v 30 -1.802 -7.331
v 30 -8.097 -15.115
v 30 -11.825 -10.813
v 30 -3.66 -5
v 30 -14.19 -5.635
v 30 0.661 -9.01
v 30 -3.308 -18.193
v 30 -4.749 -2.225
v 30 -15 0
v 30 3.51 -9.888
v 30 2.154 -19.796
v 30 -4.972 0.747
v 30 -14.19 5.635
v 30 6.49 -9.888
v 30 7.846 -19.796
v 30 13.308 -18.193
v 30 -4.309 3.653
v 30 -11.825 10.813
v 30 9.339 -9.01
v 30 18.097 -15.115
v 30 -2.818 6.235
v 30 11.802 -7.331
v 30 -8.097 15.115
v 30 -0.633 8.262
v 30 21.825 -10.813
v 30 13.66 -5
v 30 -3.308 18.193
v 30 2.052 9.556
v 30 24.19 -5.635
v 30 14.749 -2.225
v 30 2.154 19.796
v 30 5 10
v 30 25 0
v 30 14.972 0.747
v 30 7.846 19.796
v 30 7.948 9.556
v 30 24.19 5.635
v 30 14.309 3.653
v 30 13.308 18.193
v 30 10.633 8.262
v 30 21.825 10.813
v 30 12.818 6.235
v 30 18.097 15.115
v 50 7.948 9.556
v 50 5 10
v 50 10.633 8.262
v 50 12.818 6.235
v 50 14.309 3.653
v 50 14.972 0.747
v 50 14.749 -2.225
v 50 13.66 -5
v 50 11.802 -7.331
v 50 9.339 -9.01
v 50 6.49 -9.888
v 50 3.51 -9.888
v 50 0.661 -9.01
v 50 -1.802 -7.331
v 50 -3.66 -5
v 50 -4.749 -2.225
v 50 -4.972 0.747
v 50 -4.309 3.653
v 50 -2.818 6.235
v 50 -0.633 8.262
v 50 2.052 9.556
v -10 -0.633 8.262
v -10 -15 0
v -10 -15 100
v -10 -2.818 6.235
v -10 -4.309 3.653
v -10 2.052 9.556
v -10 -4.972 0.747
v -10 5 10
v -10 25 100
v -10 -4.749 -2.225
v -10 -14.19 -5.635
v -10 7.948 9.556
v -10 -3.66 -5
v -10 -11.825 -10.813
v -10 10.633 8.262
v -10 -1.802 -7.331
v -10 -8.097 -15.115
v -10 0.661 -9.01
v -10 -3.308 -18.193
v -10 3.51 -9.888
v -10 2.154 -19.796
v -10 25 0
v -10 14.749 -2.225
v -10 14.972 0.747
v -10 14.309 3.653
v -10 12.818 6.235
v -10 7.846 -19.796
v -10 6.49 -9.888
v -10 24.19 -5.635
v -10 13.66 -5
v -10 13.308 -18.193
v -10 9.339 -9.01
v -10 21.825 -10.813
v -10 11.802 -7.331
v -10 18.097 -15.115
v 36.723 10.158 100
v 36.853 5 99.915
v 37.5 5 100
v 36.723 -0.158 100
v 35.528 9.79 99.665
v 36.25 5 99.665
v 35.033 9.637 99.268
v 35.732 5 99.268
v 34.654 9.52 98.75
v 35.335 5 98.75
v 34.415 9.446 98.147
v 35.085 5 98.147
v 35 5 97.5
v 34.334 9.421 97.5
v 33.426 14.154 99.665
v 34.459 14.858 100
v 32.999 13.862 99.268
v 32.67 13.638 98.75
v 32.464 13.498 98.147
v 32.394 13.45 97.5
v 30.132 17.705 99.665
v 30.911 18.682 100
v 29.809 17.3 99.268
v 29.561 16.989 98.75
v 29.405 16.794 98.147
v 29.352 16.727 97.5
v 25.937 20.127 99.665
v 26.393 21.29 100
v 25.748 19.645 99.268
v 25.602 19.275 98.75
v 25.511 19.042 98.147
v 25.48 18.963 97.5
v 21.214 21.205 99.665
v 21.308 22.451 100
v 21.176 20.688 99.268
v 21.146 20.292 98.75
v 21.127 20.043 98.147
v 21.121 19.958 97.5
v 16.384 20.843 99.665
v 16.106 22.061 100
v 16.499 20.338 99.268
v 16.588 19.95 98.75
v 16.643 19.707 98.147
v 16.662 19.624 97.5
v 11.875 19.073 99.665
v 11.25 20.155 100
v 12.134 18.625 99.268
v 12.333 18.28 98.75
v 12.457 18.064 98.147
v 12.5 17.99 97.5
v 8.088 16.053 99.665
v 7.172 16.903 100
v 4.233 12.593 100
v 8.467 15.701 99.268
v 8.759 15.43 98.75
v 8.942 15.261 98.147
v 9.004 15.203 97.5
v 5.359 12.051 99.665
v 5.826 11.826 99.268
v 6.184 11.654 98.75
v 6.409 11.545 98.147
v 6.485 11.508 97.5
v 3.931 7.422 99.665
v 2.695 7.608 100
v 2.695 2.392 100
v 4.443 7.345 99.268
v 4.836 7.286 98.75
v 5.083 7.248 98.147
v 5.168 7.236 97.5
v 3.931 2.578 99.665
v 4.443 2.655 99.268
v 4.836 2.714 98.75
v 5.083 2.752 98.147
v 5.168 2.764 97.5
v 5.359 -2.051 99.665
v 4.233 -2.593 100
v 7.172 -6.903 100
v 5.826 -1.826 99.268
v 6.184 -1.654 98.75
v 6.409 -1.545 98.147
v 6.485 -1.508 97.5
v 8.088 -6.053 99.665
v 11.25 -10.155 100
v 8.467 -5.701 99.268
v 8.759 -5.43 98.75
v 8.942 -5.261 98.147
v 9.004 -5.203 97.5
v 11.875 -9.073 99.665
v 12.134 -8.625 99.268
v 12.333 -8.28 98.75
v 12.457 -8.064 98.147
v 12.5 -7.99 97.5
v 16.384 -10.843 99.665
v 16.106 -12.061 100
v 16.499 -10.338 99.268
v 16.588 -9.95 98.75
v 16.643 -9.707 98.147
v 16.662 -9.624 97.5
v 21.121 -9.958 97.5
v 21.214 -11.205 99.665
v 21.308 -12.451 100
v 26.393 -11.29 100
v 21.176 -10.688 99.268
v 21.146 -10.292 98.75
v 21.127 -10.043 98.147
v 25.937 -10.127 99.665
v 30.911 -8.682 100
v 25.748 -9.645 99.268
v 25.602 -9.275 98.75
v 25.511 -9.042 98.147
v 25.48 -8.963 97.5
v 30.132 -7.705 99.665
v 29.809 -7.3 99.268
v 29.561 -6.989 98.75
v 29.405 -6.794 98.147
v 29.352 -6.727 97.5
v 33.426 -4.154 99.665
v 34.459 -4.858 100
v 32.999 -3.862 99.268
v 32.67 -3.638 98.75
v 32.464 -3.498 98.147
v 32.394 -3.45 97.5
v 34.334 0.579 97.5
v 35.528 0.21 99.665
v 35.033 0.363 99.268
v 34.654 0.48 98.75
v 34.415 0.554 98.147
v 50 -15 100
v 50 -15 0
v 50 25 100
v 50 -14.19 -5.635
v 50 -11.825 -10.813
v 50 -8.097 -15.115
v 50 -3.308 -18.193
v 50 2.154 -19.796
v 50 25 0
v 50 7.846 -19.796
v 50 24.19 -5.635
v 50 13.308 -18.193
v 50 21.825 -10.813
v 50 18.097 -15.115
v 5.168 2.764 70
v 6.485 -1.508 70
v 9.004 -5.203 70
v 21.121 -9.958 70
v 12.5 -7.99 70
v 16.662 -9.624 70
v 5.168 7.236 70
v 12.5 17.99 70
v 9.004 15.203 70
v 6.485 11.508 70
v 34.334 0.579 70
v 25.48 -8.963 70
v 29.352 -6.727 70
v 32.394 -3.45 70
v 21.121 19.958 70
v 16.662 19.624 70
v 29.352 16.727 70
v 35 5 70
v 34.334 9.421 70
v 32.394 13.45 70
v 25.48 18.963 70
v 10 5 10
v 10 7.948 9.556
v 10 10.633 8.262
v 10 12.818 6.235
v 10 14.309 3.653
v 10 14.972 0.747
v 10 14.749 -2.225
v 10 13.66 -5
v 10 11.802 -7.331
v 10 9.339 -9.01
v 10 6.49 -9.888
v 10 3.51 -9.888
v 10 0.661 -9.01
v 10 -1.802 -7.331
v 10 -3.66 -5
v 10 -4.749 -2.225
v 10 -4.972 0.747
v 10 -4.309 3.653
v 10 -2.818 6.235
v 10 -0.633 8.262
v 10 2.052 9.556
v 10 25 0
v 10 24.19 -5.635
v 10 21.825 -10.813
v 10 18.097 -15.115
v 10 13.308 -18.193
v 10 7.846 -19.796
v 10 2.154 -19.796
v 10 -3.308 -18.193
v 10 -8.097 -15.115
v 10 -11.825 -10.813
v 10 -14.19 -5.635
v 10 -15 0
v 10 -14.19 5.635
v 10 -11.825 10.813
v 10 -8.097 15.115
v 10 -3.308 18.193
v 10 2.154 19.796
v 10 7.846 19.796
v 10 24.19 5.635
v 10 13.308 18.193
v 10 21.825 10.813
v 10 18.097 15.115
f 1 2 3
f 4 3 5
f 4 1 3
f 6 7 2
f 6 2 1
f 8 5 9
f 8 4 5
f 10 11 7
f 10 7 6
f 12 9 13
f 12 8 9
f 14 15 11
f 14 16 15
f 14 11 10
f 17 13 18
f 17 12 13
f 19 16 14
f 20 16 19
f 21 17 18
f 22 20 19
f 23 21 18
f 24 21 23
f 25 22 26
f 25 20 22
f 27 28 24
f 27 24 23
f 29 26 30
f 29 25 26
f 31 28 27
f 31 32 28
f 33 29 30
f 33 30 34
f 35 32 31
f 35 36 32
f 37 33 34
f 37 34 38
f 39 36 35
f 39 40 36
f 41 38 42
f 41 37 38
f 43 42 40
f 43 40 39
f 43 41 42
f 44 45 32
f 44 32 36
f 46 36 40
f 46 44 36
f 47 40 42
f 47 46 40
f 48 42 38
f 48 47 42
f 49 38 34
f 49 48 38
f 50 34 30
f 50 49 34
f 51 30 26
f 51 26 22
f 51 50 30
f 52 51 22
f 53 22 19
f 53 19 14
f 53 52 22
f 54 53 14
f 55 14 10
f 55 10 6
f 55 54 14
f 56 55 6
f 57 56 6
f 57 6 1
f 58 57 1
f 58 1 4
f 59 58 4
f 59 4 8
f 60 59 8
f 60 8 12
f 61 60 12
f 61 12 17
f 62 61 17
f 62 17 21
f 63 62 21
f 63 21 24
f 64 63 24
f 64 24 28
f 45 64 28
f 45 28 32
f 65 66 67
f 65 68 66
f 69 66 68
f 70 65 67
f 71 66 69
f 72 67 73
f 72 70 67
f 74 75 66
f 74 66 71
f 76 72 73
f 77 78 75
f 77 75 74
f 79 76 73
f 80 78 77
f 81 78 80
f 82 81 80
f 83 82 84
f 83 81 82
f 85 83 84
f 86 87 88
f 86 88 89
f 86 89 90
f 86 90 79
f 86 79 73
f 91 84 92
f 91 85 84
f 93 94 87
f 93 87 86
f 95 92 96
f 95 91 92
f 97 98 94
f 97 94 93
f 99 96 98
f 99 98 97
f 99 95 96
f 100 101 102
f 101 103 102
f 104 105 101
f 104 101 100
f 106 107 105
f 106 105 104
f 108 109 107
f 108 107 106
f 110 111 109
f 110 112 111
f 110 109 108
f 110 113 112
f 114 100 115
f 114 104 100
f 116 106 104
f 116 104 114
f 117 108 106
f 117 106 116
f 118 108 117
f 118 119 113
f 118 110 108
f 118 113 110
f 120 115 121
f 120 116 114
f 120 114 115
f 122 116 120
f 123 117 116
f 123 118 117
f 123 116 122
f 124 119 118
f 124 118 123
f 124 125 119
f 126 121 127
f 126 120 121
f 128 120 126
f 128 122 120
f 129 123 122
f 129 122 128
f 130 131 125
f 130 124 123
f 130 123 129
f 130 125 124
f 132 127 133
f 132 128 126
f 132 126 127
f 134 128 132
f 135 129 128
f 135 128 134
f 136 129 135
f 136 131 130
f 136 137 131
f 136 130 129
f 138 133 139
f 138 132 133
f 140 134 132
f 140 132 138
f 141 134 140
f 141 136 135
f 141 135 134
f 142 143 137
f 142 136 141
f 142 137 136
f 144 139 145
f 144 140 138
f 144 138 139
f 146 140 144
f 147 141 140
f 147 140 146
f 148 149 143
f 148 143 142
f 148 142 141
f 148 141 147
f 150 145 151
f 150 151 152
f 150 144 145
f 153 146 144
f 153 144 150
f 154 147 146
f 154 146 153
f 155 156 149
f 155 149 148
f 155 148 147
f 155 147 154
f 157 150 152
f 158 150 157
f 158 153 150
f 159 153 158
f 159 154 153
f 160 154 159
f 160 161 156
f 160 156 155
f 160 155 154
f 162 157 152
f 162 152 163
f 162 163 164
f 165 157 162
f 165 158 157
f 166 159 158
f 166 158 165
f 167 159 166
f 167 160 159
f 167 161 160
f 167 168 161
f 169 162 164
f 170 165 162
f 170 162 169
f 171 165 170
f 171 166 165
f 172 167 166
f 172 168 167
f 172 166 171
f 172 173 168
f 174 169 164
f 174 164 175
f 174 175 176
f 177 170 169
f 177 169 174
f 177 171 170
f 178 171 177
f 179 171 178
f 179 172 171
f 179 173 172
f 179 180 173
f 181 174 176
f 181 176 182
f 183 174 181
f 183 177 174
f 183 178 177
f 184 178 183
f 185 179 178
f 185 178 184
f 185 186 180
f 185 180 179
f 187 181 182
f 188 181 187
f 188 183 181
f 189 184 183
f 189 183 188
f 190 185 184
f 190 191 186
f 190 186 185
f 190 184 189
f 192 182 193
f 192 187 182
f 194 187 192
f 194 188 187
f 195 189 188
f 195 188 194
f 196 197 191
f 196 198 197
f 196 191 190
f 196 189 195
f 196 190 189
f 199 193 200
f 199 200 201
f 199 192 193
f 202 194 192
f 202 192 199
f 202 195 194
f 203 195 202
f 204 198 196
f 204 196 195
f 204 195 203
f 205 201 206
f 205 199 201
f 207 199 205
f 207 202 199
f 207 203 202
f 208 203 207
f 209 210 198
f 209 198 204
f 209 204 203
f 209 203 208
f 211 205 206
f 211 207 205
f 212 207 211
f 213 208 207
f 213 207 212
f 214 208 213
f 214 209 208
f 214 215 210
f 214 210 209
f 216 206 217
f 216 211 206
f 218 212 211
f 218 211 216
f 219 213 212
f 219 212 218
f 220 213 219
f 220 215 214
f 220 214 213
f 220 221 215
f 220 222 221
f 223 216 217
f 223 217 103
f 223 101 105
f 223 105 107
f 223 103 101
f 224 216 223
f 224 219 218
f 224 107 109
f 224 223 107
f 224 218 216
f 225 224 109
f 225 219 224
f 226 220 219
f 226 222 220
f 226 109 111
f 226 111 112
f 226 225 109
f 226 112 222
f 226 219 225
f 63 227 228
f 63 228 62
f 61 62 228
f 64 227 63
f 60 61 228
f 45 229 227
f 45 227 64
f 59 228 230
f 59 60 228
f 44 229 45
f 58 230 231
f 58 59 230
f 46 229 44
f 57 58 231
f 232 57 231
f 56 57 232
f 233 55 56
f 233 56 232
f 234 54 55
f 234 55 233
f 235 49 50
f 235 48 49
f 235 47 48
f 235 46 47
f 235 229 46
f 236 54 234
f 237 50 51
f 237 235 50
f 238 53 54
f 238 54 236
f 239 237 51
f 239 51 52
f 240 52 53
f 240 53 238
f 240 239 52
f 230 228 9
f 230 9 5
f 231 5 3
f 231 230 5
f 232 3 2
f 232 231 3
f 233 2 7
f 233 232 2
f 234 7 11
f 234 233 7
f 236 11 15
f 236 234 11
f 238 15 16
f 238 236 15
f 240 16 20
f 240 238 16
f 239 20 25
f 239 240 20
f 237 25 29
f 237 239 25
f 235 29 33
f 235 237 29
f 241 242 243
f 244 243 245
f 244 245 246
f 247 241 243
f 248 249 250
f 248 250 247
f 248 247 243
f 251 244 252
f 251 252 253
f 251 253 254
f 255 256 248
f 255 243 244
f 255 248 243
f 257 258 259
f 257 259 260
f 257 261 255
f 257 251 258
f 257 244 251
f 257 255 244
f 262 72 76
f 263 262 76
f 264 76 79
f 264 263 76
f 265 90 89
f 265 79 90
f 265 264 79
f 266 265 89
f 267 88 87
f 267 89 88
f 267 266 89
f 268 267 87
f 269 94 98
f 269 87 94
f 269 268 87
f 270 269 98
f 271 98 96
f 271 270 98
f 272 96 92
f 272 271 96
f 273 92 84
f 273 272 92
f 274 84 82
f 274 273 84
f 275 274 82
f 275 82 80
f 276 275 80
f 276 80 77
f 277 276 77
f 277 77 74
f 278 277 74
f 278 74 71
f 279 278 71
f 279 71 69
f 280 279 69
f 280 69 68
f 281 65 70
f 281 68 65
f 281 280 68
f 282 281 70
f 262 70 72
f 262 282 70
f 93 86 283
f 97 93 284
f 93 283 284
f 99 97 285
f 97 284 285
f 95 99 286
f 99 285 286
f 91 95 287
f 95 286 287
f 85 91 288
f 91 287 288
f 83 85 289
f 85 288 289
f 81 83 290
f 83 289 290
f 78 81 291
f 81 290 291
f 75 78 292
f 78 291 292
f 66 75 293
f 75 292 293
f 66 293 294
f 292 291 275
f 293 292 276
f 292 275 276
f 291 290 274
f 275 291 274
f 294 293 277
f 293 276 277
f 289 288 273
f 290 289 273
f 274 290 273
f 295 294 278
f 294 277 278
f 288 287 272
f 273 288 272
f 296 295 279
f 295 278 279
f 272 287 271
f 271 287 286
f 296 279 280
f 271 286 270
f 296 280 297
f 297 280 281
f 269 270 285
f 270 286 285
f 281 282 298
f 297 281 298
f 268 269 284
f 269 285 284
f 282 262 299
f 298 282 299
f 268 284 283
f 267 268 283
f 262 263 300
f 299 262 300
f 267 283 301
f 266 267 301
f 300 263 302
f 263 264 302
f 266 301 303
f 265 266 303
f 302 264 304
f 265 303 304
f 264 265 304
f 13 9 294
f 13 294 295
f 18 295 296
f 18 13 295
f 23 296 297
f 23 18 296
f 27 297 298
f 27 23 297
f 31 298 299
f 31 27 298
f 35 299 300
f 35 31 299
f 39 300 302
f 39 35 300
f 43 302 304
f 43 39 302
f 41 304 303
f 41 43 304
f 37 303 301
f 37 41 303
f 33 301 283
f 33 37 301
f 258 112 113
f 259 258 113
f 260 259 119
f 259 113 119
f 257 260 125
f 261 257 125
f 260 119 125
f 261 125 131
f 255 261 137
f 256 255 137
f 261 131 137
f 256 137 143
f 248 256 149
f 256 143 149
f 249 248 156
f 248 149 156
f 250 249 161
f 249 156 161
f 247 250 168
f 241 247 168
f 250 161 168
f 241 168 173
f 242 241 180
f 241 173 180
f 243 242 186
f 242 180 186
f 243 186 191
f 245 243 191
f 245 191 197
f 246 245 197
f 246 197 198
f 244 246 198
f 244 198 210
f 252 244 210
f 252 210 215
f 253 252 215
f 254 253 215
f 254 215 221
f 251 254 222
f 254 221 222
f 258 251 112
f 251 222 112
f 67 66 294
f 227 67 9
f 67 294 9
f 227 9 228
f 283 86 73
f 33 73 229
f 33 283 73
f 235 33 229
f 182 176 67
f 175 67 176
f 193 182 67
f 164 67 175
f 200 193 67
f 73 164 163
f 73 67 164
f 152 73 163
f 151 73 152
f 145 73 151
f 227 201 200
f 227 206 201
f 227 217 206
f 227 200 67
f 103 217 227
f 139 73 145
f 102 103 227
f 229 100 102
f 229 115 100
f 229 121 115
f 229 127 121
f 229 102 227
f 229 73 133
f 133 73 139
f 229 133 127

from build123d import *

# Parameters (mm, degrees)
SKETCH_1_W               = 60
SKETCH_1_H               = 40
EXTRUDE_1_DEPTH          = 100
SKETCH_6_R               = 20
EXTRUDE_2_DEPTH          = 20
EXTRUDE_START            = -20
SKETCH_7_R               = 20
EXTRUDE_3_DEPTH          = 20
CUT_EXTRUDE_1_DEPTH      = 120.268604419
CUT_EXTRUDE_1_DEPTH_BACK = 120.268604419
SKETCH_8_R               = 10
SKETCH_9_R               = 20
CUT_EXTRUDE_2_DEPTH      = 20
SKETCH_10_R              = 15
CUT_EXTRUDE_3_DEPTH      = 30
FILLET_2_R               = 2.5


with BuildPart() as part:
    # 스케치1 → 보스-돌출1 (new body)
    with BuildSketch(Plane.XY):
        with Locations((20, 5)):
            Rectangle(SKETCH_1_W, SKETCH_1_H)
    extrude(amount=EXTRUDE_1_DEPTH)

    # 스케치6 → 보스-돌출2 (add)
    with BuildSketch(Plane(origin=(50, 0, 0), x_dir=(0, 0, -1), z_dir=(1, 0, 0))):
        with Locations((0, 5)):
            Circle(SKETCH_6_R)
    extrude(amount=-EXTRUDE_2_DEPTH)

    # 스케치7 → 보스-돌출3 (add)
    with BuildSketch(Plane.ZY.offset(10).offset(EXTRUDE_START)):
        with Locations((0, 5)):
            Circle(SKETCH_7_R)
    extrude(amount=EXTRUDE_3_DEPTH)

    # 스케치8 → 컷-돌출1 (cut, two sides: drawn at the far end of the back side and taken through both)
    with BuildSketch(Plane.ZY.offset(10).offset(-CUT_EXTRUDE_1_DEPTH_BACK)):
        with Locations((0, 5)):
            Circle(SKETCH_8_R)
    extrude(amount=CUT_EXTRUDE_1_DEPTH + CUT_EXTRUDE_1_DEPTH_BACK, mode=Mode.SUBTRACT)

    # 스케치9 → 컷-돌출2 (cut)
    with BuildSketch(Plane.ZY.offset(-30)):
        with Locations((0, 5)):
            Circle(SKETCH_9_R)
    extrude(amount=CUT_EXTRUDE_2_DEPTH, mode=Mode.SUBTRACT)

    # 스케치10 → 컷-돌출3 (cut)
    with BuildSketch(Plane.XY.offset(100)):
        with Locations((20, 5)):
            Circle(SKETCH_10_R)
    extrude(amount=-CUT_EXTRUDE_3_DEPTH, mode=Mode.SUBTRACT)

    # 필렛2
    fillet_2_edges = [part.edges().sort_by_distance(p)[0] for p in [
        (5, 5, 100),
    ]]
    fillet(fillet_2_edges, radius=FILLET_2_R)


solid = part.part
